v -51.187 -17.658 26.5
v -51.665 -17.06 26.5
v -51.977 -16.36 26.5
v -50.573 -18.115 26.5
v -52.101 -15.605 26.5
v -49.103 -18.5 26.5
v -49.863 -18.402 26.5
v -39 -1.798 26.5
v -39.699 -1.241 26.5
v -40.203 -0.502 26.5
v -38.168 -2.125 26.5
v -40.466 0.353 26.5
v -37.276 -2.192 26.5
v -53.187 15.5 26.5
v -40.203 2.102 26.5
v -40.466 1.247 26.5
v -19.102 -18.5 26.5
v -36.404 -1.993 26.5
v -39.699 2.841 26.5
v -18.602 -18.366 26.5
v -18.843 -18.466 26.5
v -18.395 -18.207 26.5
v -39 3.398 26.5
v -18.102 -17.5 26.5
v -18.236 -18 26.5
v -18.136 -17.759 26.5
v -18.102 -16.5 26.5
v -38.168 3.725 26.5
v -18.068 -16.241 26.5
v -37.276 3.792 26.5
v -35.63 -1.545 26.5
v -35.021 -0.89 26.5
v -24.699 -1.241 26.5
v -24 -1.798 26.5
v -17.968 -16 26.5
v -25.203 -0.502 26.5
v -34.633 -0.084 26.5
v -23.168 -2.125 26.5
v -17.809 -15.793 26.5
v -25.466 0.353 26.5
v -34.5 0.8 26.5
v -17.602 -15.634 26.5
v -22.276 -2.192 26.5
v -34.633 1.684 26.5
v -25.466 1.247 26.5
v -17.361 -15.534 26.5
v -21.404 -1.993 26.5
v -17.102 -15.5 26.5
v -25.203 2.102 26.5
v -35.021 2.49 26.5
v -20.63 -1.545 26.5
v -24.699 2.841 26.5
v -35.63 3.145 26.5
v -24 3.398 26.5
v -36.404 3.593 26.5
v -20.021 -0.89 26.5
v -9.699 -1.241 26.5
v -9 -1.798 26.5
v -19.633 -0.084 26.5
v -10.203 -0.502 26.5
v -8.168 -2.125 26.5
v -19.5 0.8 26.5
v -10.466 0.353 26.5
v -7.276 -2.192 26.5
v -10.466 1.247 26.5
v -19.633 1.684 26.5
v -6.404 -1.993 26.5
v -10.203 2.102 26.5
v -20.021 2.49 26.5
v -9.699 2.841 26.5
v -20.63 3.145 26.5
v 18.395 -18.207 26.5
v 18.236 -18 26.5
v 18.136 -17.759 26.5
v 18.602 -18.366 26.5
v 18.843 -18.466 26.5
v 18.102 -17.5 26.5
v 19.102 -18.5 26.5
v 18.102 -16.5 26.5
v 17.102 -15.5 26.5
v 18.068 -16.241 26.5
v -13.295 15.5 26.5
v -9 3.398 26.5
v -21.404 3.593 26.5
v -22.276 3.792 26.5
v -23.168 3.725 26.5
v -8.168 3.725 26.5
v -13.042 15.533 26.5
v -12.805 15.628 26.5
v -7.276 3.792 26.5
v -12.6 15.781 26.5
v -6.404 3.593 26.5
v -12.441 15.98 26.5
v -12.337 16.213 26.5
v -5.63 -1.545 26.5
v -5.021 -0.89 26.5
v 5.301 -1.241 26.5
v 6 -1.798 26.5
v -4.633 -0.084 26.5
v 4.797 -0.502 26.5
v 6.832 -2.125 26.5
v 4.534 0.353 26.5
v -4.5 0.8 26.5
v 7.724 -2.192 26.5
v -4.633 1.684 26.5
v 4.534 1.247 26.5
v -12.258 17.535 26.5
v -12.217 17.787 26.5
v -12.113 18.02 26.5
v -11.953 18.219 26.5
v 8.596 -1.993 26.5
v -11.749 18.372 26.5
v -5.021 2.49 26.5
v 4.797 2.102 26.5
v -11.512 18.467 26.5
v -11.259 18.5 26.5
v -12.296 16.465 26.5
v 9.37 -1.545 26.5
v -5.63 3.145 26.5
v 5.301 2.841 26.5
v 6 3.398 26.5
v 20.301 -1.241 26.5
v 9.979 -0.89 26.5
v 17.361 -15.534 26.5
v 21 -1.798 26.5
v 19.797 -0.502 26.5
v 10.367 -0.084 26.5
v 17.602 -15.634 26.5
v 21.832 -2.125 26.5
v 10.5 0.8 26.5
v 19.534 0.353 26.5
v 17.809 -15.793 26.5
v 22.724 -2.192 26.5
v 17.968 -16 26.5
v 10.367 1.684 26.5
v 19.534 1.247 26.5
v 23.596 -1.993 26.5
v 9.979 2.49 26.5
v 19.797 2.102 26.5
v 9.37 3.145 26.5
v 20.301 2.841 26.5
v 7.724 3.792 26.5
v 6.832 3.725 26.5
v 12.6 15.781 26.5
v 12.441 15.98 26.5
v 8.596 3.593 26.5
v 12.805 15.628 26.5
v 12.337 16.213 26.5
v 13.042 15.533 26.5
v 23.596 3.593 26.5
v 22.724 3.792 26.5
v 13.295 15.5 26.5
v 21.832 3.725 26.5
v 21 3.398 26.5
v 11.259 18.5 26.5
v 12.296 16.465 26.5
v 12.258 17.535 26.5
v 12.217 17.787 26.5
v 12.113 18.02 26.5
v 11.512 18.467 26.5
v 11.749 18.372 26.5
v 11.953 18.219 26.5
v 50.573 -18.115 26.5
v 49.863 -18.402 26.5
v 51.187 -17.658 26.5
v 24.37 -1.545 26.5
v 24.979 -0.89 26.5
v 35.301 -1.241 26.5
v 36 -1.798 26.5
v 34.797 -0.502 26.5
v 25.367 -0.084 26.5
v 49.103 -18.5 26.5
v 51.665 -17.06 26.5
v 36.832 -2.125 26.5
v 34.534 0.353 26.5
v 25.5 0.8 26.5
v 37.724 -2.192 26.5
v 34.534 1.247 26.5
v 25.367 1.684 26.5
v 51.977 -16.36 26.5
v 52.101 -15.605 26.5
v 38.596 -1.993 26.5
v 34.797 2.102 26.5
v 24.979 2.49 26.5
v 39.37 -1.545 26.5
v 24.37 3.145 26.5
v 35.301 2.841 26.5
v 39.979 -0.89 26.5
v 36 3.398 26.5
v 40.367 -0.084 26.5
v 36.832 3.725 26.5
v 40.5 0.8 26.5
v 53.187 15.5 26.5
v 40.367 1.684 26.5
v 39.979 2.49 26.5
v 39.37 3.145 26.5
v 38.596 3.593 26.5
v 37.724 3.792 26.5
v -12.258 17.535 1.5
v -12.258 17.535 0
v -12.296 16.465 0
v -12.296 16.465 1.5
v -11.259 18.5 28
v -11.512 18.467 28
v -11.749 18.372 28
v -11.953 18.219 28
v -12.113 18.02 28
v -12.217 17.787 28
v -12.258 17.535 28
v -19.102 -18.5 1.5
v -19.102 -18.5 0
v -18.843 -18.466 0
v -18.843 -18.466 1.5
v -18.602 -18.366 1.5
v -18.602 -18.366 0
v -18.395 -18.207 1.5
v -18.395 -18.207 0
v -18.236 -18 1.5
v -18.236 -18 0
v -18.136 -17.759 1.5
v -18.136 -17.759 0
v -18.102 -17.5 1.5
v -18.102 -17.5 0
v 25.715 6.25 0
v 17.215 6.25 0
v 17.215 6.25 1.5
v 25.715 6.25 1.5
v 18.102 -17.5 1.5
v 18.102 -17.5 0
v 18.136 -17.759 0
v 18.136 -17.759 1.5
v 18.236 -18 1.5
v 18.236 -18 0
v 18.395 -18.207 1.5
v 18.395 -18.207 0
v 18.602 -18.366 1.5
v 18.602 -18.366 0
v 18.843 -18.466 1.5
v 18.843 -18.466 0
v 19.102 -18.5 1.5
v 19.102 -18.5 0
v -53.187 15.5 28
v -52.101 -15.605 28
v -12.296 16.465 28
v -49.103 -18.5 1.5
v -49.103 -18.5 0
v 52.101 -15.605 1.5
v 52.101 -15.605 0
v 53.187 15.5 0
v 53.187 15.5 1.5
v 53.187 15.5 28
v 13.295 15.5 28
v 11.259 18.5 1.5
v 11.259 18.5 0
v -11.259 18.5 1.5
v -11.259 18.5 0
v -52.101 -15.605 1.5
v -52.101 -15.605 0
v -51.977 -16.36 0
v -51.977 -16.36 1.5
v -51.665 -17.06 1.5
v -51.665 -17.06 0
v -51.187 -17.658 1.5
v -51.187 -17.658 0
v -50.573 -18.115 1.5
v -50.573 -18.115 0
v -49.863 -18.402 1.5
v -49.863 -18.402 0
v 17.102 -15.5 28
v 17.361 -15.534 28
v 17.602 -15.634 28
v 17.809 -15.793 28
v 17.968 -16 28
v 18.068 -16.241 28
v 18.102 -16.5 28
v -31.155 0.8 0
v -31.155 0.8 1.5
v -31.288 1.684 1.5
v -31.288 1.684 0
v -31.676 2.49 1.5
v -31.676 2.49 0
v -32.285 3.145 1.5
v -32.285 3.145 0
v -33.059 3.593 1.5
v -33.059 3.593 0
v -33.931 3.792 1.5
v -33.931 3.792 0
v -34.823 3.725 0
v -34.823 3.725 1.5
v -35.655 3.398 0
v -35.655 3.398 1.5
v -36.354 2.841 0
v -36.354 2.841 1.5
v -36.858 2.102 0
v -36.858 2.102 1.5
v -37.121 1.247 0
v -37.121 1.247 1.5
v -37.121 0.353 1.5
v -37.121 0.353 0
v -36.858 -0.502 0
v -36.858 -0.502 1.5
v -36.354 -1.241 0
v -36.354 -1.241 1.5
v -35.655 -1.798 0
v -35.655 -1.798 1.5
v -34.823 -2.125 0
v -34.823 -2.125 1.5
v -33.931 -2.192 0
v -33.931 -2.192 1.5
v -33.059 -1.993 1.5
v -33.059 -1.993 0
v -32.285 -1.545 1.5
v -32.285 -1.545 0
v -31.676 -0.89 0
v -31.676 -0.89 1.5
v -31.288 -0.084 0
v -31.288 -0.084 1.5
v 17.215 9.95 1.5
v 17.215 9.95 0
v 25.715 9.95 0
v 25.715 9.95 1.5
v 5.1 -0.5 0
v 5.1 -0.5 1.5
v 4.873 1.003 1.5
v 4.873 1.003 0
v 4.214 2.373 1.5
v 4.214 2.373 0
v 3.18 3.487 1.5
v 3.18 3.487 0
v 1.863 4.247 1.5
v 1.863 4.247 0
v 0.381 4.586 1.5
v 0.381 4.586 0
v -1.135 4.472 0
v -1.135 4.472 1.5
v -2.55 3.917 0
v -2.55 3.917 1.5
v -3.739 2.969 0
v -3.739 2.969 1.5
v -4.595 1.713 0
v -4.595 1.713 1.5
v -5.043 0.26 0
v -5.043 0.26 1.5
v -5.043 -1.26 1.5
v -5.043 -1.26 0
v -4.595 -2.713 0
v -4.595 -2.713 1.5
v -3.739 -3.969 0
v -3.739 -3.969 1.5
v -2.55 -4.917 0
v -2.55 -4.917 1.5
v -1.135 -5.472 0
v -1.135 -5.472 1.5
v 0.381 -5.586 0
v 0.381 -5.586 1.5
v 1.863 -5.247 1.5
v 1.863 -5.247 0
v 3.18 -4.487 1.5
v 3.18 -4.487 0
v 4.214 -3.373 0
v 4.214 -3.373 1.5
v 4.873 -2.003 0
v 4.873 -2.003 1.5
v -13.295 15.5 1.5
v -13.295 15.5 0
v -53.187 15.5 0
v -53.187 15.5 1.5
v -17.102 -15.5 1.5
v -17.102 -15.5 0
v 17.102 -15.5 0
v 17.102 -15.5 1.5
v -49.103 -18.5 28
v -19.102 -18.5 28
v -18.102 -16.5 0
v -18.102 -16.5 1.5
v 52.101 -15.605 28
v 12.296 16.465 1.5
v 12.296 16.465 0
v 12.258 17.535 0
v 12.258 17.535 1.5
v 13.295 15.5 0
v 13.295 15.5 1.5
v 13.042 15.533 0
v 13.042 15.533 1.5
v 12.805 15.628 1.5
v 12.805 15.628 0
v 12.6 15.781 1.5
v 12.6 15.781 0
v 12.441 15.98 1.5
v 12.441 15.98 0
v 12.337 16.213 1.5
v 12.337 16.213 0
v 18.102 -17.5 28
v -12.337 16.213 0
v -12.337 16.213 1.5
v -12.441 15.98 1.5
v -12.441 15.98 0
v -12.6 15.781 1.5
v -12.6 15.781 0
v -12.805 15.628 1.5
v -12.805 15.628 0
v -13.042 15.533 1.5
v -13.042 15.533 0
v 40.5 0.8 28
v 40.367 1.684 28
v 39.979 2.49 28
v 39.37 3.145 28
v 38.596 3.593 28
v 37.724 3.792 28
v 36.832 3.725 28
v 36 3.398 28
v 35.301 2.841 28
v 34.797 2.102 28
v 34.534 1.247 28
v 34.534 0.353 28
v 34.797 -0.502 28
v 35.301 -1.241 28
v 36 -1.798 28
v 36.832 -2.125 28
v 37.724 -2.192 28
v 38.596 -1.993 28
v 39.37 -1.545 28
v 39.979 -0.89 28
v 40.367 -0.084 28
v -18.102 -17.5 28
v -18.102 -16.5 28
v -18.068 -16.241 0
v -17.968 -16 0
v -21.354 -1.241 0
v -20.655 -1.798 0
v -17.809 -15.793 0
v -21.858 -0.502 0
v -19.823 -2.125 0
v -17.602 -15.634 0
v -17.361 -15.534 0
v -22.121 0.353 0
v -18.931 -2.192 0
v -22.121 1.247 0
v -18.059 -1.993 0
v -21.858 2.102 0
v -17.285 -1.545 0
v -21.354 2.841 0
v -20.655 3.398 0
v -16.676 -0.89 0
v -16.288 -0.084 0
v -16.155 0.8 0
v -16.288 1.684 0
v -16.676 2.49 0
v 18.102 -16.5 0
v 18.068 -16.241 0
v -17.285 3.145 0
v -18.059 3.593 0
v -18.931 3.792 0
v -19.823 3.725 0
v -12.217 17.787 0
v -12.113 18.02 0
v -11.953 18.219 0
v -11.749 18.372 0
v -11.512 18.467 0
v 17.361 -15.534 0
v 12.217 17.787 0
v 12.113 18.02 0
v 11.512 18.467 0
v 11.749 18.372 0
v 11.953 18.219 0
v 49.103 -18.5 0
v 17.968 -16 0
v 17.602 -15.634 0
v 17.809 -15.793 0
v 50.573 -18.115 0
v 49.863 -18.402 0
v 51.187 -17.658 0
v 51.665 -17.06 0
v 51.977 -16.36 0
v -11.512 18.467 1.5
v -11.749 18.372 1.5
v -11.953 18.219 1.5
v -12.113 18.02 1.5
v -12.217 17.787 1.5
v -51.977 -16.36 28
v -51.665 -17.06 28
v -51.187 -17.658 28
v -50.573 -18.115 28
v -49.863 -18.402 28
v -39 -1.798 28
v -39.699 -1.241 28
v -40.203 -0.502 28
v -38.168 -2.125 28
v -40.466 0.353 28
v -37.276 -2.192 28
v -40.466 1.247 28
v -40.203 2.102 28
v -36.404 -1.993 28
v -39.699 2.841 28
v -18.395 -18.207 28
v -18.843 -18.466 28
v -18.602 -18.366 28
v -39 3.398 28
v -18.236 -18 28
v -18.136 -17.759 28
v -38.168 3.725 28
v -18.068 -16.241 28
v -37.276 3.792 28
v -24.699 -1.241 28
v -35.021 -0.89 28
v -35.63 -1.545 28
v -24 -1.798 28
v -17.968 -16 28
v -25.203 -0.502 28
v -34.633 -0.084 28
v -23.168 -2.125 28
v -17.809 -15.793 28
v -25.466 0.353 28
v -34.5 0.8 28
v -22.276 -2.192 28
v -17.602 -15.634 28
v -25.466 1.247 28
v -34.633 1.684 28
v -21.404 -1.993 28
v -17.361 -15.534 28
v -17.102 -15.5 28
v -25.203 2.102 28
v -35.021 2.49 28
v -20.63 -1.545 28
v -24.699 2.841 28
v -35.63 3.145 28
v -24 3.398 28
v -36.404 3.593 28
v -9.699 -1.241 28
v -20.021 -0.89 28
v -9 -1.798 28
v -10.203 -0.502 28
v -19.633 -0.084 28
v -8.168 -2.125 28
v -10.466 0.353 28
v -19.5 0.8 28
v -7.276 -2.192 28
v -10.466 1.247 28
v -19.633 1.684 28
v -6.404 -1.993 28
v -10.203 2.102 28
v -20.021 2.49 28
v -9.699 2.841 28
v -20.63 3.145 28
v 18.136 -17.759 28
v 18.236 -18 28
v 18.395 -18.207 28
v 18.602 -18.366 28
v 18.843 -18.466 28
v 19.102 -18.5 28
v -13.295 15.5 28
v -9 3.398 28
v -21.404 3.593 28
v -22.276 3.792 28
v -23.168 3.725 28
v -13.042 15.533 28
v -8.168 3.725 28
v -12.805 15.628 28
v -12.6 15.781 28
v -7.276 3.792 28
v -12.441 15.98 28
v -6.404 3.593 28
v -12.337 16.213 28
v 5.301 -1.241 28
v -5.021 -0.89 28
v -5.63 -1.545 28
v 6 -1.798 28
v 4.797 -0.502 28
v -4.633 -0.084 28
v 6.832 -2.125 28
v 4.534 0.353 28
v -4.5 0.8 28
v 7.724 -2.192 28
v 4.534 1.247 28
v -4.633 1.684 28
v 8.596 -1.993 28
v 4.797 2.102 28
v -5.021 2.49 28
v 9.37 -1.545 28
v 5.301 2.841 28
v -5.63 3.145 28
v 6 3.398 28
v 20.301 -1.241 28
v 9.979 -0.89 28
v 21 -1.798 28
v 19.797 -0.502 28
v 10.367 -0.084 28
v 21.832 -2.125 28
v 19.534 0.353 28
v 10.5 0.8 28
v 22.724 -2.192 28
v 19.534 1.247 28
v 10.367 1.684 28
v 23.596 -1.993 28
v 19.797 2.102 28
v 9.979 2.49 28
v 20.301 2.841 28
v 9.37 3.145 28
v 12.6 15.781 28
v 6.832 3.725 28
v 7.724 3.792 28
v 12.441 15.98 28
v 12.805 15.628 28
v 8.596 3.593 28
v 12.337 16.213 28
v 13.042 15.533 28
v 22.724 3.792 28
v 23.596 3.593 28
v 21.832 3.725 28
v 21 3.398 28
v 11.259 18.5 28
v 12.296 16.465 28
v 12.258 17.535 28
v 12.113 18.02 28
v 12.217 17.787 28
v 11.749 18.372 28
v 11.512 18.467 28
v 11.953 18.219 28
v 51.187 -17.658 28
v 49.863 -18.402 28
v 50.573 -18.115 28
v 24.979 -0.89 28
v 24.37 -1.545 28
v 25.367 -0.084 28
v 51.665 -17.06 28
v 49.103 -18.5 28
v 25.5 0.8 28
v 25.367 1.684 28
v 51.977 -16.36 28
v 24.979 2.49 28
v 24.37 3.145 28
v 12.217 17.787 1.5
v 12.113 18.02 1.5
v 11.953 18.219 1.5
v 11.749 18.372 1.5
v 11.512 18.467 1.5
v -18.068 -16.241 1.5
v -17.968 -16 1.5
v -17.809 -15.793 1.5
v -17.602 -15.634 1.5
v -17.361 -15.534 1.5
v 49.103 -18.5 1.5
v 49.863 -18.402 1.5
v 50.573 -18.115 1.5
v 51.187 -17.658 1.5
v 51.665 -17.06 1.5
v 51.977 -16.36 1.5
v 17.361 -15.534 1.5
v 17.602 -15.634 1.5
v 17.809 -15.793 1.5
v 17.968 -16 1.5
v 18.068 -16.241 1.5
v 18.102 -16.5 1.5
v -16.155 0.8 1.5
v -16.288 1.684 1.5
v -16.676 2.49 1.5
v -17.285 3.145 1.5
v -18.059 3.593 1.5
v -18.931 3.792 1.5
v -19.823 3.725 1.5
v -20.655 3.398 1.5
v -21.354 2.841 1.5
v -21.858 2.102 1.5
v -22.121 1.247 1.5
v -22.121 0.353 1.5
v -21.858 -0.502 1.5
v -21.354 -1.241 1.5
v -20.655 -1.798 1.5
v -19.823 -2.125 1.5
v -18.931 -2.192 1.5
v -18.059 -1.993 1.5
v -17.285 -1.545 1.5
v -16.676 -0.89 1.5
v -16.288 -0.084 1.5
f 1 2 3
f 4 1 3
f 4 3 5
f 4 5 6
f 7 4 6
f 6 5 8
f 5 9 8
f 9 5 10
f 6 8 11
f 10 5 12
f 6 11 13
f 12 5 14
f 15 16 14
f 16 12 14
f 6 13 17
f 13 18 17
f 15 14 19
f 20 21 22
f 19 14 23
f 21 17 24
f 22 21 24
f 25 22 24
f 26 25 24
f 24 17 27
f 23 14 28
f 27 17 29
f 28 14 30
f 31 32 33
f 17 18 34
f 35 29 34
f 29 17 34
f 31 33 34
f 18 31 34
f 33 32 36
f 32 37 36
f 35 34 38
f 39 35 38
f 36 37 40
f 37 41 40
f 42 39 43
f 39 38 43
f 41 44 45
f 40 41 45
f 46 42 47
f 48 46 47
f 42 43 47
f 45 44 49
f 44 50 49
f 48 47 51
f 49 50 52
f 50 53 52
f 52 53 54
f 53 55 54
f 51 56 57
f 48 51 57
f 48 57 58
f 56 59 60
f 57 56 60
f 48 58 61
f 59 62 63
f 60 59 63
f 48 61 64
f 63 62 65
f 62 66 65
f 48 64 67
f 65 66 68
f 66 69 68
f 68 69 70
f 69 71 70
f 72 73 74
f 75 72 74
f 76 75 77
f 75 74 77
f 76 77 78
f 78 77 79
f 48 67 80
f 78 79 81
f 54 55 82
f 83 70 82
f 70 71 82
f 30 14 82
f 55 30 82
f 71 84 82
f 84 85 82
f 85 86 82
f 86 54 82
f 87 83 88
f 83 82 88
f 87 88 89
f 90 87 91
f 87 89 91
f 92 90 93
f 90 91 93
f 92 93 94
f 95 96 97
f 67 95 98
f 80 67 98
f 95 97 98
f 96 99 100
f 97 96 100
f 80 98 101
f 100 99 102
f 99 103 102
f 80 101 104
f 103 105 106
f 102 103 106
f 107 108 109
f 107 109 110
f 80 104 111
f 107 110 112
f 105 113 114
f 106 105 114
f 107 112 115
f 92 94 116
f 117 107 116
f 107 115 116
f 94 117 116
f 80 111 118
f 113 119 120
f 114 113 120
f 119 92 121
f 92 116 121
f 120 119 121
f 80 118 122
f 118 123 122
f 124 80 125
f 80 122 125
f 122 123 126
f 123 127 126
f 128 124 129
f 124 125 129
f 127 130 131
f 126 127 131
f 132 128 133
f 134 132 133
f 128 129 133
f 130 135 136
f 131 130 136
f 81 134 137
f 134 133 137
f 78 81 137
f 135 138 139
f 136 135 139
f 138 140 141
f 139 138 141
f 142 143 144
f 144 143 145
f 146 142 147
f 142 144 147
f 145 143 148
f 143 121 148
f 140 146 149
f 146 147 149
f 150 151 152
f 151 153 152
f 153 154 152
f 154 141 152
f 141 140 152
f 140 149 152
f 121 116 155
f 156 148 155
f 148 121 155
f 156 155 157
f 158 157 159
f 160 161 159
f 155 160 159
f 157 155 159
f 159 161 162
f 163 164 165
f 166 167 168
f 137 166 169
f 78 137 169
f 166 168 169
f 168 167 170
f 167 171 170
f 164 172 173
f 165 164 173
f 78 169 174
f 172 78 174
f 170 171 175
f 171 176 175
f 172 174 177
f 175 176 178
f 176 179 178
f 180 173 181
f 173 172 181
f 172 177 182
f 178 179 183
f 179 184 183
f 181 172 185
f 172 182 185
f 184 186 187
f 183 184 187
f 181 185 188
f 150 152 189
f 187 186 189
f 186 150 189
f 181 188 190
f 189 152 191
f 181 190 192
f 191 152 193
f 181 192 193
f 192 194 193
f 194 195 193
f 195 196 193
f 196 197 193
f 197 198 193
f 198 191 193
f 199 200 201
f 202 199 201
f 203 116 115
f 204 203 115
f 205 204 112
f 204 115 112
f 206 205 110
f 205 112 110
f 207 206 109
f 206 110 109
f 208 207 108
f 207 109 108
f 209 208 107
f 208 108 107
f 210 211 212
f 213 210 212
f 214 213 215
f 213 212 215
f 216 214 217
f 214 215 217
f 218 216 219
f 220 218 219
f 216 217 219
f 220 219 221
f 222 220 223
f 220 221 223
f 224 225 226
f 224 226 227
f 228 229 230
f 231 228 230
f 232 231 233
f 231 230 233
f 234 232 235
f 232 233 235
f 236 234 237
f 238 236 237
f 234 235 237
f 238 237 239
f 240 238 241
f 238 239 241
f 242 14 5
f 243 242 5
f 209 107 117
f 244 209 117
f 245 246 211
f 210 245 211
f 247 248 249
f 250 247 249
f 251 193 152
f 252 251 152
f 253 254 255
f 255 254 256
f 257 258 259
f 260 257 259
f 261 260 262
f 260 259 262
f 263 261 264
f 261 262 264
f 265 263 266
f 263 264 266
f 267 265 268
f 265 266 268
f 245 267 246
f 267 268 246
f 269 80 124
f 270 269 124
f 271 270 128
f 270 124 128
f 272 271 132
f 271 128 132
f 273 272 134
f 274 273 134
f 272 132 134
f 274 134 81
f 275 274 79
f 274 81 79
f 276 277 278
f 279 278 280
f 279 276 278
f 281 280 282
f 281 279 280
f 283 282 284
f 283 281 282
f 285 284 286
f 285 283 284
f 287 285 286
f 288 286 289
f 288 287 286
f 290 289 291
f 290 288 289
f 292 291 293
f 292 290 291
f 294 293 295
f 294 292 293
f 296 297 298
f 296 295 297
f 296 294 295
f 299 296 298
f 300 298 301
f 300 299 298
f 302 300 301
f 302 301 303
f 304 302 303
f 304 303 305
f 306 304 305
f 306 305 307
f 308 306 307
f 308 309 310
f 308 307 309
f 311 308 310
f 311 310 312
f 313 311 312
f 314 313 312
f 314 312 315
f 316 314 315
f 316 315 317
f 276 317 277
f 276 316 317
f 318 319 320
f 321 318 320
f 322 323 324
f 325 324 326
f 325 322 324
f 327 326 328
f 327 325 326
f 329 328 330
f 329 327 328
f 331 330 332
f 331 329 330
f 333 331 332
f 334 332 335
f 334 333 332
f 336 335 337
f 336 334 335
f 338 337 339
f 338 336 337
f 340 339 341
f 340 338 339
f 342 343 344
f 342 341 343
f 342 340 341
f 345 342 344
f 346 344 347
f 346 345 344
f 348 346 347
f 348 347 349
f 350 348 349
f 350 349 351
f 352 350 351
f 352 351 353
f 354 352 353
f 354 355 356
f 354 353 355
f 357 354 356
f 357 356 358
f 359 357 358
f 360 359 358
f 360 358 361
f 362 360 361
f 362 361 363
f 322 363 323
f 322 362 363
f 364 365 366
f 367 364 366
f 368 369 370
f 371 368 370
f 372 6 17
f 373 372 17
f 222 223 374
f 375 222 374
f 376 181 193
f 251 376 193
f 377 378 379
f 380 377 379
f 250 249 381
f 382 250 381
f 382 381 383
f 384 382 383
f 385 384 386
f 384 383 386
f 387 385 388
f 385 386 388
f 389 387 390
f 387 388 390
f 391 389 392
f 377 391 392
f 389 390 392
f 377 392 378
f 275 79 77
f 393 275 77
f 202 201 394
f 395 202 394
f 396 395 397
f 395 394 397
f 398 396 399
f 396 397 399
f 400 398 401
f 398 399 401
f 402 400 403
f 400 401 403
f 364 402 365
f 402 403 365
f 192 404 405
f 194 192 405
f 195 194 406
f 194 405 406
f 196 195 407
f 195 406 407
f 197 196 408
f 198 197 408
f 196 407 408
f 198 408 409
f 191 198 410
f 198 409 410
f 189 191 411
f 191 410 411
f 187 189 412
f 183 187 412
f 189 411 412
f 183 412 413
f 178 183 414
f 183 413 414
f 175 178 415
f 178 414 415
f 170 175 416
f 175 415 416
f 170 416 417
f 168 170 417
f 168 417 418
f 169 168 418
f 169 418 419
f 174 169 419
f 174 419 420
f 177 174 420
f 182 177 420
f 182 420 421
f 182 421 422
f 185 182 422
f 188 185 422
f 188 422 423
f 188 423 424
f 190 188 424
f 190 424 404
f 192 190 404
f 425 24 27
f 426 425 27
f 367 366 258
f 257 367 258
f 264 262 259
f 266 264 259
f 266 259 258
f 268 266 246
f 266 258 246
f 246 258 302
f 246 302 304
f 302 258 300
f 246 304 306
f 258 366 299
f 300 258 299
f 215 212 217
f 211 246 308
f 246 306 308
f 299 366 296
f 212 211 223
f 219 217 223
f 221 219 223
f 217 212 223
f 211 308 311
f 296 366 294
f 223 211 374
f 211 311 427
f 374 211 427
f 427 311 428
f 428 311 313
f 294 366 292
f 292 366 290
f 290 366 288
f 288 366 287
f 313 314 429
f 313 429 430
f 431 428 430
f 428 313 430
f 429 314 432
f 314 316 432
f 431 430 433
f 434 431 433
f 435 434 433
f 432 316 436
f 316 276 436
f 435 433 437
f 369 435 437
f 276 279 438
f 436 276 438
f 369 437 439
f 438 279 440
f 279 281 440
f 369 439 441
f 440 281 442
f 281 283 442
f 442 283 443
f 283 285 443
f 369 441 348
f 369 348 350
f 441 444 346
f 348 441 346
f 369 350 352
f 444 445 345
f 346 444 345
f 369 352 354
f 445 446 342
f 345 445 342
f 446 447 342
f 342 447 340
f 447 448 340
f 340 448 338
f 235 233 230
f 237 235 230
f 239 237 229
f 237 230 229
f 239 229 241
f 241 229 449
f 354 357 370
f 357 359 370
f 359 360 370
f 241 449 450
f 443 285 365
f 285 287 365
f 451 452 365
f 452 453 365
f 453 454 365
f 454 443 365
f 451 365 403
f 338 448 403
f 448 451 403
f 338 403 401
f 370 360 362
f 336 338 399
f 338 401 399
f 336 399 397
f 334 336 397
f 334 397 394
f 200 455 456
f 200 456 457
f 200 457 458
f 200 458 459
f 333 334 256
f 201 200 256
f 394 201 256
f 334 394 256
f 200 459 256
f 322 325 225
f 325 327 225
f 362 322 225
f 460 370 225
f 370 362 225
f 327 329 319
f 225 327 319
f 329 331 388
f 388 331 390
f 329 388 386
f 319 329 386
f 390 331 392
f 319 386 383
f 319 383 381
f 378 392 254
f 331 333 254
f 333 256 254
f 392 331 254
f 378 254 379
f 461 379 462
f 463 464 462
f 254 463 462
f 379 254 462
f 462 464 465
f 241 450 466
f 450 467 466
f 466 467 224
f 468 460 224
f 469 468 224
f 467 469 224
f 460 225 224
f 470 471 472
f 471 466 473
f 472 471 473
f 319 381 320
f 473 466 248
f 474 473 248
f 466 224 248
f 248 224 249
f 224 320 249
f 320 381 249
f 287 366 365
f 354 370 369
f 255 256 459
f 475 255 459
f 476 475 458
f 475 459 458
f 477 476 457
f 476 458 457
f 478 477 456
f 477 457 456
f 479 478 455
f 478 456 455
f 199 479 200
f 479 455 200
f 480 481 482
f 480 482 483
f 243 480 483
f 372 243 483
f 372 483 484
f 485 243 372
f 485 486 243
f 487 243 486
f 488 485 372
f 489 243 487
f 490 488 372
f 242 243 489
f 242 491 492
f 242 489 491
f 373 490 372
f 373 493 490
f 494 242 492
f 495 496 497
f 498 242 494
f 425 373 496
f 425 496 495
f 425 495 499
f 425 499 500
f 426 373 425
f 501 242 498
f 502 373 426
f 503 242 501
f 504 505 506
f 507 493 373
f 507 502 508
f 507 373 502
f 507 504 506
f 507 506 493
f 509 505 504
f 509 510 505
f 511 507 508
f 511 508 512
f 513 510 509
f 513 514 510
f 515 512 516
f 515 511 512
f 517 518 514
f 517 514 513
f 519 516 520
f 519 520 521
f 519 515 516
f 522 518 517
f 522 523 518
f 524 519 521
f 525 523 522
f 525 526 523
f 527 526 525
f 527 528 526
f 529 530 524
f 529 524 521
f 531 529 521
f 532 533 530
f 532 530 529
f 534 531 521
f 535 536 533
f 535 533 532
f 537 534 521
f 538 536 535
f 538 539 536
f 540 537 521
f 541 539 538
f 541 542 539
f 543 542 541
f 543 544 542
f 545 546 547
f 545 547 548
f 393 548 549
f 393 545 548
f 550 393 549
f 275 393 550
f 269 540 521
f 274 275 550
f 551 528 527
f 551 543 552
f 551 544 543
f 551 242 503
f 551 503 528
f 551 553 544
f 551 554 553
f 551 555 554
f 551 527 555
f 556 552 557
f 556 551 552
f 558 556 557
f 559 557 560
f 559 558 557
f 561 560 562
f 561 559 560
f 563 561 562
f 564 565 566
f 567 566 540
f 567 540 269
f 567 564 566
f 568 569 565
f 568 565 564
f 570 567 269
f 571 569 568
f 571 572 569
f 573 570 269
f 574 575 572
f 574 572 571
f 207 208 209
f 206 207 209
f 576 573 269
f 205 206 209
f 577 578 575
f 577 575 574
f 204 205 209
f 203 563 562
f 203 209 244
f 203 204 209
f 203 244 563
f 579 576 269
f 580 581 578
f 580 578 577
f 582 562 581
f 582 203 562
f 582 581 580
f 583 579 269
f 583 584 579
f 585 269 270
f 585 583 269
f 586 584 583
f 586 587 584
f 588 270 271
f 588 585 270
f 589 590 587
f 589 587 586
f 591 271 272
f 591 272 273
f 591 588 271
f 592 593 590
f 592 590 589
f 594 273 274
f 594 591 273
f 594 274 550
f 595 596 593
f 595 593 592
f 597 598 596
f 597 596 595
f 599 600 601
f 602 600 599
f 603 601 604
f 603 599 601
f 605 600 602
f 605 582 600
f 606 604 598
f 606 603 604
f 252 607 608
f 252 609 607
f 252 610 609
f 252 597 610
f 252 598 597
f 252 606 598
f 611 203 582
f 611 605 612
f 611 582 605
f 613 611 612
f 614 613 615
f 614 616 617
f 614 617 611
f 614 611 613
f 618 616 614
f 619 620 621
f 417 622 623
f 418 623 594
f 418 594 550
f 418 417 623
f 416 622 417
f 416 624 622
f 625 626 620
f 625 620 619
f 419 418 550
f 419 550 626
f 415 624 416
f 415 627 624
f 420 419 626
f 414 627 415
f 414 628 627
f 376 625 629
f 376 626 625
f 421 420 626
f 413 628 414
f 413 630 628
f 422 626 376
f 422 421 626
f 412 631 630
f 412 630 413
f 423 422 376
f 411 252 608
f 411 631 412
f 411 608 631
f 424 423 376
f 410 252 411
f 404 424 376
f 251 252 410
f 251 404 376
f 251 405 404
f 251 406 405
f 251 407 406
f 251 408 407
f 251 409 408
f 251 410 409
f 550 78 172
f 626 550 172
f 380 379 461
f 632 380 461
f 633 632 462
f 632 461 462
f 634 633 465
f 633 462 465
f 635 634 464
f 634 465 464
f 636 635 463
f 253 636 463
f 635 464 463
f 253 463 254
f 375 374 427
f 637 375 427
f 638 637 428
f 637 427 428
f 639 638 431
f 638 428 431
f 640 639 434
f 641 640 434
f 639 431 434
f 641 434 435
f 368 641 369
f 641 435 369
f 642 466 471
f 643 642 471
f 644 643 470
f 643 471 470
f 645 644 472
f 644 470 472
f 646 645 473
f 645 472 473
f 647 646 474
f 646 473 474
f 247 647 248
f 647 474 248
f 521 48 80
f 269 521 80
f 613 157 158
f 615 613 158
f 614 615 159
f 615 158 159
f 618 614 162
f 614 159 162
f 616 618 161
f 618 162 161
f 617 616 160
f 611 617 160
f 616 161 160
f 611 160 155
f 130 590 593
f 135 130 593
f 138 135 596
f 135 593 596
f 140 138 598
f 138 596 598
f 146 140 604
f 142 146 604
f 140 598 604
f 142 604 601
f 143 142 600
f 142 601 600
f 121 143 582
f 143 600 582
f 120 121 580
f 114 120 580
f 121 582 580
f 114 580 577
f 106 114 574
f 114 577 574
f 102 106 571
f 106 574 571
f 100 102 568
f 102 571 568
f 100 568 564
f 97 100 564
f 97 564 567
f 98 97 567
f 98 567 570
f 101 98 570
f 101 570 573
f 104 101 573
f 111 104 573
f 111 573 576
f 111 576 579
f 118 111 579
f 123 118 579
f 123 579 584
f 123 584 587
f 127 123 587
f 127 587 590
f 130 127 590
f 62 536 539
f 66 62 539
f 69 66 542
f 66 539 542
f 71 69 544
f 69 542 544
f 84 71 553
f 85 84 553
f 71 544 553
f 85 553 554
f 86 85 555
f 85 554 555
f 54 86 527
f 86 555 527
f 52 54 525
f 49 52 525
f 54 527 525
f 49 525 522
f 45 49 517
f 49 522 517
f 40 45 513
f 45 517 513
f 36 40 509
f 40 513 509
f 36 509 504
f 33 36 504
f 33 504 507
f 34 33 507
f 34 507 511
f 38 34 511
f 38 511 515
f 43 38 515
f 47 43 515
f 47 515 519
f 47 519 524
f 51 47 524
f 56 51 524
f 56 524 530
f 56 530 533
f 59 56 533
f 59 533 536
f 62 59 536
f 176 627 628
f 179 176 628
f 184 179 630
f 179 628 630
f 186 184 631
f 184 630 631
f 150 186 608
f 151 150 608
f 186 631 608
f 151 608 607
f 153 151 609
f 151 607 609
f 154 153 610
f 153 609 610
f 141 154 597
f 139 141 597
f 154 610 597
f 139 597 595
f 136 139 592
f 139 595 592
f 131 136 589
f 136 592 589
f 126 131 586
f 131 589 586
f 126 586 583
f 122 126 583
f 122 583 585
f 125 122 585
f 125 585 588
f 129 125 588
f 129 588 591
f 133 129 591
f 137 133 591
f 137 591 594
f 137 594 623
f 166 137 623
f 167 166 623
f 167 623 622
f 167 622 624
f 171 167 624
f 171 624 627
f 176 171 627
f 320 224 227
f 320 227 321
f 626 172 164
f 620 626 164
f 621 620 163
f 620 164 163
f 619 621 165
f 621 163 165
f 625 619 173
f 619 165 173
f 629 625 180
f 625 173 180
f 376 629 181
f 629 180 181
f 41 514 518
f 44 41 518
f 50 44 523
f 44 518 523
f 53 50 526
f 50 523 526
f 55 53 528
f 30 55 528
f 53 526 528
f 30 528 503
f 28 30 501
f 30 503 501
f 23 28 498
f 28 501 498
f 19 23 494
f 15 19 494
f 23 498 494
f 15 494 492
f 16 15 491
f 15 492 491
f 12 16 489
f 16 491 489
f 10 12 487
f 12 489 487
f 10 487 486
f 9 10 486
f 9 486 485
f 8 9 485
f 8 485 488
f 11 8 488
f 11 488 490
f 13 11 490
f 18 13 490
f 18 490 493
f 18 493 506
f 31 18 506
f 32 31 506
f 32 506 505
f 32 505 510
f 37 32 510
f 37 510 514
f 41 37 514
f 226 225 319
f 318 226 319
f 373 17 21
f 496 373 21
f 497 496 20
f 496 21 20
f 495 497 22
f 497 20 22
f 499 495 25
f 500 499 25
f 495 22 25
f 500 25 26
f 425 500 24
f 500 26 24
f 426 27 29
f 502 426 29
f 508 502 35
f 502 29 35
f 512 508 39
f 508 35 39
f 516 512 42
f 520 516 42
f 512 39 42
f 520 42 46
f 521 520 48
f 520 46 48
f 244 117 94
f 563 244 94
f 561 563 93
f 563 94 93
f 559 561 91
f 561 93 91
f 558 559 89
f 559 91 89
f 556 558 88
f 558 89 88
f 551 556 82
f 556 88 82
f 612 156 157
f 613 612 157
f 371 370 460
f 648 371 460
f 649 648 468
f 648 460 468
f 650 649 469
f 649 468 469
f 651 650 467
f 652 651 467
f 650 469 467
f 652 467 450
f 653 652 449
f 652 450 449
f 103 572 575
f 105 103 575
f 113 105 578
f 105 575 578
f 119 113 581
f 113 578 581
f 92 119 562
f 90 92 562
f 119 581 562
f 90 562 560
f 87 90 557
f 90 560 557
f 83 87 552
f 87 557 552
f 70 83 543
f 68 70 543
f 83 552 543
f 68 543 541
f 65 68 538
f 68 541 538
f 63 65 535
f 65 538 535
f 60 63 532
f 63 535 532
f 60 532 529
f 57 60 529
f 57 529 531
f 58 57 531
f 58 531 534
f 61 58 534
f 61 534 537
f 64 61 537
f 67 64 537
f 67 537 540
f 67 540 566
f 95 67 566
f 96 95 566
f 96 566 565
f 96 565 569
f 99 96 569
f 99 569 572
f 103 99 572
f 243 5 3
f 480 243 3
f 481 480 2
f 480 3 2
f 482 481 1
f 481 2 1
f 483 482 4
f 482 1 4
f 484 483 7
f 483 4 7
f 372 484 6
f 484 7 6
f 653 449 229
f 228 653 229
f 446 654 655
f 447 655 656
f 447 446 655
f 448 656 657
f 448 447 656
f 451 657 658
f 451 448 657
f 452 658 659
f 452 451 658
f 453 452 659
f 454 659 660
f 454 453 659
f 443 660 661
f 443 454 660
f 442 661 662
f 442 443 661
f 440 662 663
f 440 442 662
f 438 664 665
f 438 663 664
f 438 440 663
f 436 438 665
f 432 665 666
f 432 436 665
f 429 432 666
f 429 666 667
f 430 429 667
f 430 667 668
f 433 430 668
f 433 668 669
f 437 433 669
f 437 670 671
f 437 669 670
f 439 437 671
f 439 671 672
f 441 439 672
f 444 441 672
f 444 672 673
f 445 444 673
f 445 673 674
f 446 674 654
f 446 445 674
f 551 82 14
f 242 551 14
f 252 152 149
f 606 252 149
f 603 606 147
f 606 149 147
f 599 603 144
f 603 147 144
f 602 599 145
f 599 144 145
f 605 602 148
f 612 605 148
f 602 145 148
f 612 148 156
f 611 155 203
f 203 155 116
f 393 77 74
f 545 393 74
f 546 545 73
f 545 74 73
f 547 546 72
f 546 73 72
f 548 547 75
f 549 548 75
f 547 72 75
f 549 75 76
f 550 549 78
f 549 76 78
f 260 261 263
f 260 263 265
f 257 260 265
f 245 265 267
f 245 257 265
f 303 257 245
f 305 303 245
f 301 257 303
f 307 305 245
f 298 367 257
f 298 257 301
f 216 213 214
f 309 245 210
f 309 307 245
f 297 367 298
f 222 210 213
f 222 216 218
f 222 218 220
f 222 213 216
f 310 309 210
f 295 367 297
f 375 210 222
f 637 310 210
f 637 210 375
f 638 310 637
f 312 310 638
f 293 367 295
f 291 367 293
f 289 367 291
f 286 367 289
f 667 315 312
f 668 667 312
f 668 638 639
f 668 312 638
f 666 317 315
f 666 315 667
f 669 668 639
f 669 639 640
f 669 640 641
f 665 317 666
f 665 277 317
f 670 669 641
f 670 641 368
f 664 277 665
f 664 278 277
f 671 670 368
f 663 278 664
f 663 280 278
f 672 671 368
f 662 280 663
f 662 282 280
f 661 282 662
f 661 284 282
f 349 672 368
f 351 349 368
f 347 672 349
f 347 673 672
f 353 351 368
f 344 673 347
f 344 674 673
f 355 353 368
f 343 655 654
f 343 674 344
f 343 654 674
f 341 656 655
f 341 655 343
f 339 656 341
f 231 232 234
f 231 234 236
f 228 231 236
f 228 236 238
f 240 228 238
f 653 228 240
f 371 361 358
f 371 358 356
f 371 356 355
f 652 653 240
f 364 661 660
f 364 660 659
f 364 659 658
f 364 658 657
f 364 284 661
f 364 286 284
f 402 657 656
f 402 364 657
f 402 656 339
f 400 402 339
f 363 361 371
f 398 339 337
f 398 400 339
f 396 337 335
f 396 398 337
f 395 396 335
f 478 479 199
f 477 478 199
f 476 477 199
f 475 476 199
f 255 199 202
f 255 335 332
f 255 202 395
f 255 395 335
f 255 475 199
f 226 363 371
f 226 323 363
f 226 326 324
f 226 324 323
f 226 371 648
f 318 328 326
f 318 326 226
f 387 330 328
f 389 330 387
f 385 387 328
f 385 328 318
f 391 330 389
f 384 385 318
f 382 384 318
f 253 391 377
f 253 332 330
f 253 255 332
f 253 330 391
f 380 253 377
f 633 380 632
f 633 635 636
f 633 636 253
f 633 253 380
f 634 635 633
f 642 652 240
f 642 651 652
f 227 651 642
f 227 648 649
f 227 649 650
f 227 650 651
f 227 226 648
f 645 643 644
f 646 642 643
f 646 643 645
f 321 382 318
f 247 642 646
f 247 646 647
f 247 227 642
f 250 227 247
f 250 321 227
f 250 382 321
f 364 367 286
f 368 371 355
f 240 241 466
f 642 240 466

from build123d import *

# Parameters (mm, degrees)
F1_DEPTH = 1.5
F2_R     = 3
F2_R_2   = 5.1
F2_W     = 8.5
F2_H     = 3.7
F3_DEPTH = 25
F6_DEPTH = 1.5
F7_R     = 3
F8_DEPTH = 5


# Not quite as in the source:
# - ends of sketch curves that miss each other by under 0.0002 mm in the source are joined


with BuildPart() as f1:
    # F0 (on Top) → F1 (new body)
    with BuildSketch(Plane.XY):
        with BuildLine():
            ThreePointArc((49.102934, -18.5), (51.1869092815, -17.6580192367), (52.1011064976, -15.6046980174))
            Line((52.1011064976, -15.6046980174), (53.187306, 15.5))
            Line((53.187306, 15.5), (13.294894, 15.5))
            ThreePointArc((13.294894, 15.5), (12.6002354488, 15.7806603742), (12.2955031554, 16.4651010054))
            Line((12.2955031554, 16.4651010054), (12.258145, 17.534899))
            ThreePointArc((12.258145, 17.534899), (11.9534125512, 18.2193396258), (11.258754, 18.5))
            Line((11.258754, 18.5), (-11.258754, 18.5))
            ThreePointArc((-11.258754, 18.5), (-11.9534125512, 18.2193396258), (-12.2581448446, 17.5348989946))
            Line((-12.2581448446, 17.5348989946), (-12.295503, 16.465101))
            ThreePointArc((-12.295503, 16.465101), (-12.6002354488, 15.7806603742), (-13.294894, 15.5))
            Line((-13.294894, 15.5), (-53.187306, 15.5))
            Line((-53.187306, 15.5), (-52.101106, -15.604698))
            ThreePointArc((-52.101106, -15.604698), (-51.1869092815, -17.6580192367), (-49.102934, -18.5))
            Line((-49.102934, -18.5), (-19.10173, -18.5))
            ThreePointArc((-19.10173, -18.5), (-18.3946232188, -18.2071067812), (-18.10173, -17.5))
            Line((-18.10173, -17.5), (-18.10173, -16.5))
            ThreePointArc((-18.10173, -16.5), (-17.8088367812, -15.7928932188), (-17.10173, -15.5))
            Line((-17.10173, -15.5), (17.10173, -15.5))
            ThreePointArc((17.10173, -15.5), (17.8088367812, -15.7928932188), (18.10173, -16.5))
            Line((18.10173, -16.5), (18.10173, -17.5))
            ThreePointArc((18.10173, -17.5), (18.3946232188, -18.2071067812), (19.10173, -18.5))
            Line((19.10173, -18.5), (49.102934, -18.5))
        make_face()
    extrude(amount=F1_DEPTH)

    # F2 (on face) → F3 (cut)
    with BuildSketch(Plane.XY):
        with Locations((-34.155, 0.8)):
            Circle(F2_R)
        with Locations((-19.155, 0.8)):
            Circle(F2_R)
        with Locations((0, -0.5)):
            Circle(F2_R_2)
        with Locations((21.465, 8.1)):
            Rectangle(F2_W, F2_H)
    extrude(amount=F3_DEPTH, mode=Mode.SUBTRACT)


with BuildPart() as f6:
    # F5 (on offset) → F6 (new body)
    with BuildSketch(Plane.XY.offset(26.5)):
        with BuildLine():
            ThreePointArc((49.102934, -18.5), (51.1869092815, -17.6580192367), (52.1011064976, -15.6046980174))
            Line((52.1011064976, -15.6046980174), (53.187306, 15.5))
            Line((53.187306, 15.5), (13.294894, 15.5))
            ThreePointArc((13.294894, 15.5), (12.6002354488, 15.7806603742), (12.2955031554, 16.4651010054))
            Line((12.2955031554, 16.4651010054), (12.258145, 17.534899))
            ThreePointArc((12.258145, 17.534899), (11.9534125512, 18.2193396258), (11.258754, 18.5))
            Line((11.258754, 18.5), (-11.258754, 18.5))
            ThreePointArc((-11.258754, 18.5), (-11.9534125512, 18.2193396258), (-12.2581448446, 17.5348989946))
            Line((-12.2581448446, 17.5348989946), (-12.295503, 16.465101))
            ThreePointArc((-12.295503, 16.465101), (-12.6002354488, 15.7806603742), (-13.294894, 15.5))
            Line((-13.294894, 15.5), (-53.187306, 15.5))
            Line((-53.187306, 15.5), (-52.101106, -15.604698))
            ThreePointArc((-52.101106, -15.604698), (-51.1869092815, -17.6580192367), (-49.102934, -18.5))
            Line((-49.102934, -18.5), (-19.10173, -18.5))
            ThreePointArc((-19.10173, -18.5), (-18.3946232188, -18.2071067812), (-18.10173, -17.5))
            Line((-18.10173, -17.5), (-18.10173, -16.5))
            ThreePointArc((-18.10173, -16.5), (-17.8088367812, -15.7928932188), (-17.10173, -15.5))
            Line((-17.10173, -15.5), (17.10173, -15.5))
            ThreePointArc((17.10173, -15.5), (17.8088367812, -15.7928932188), (18.10173, -16.5))
            Line((18.10173, -16.5), (18.10173, -17.5))
            ThreePointArc((18.10173, -17.5), (18.3946232188, -18.2071067812), (19.10173, -18.5))
            Line((19.10173, -18.5), (49.102934, -18.5))
        make_face()
    extrude(amount=F6_DEPTH)

    # F7 (on face) → F8 (cut)
    with BuildSketch(Plane.XY.offset(28)):
        with Locations((-37.5, 0.8)):
            Circle(F7_R)
        with Locations((-22.5, 0.8)):
            Circle(F7_R)
        with Locations((-7.5, 0.8)):
            Circle(F7_R)
        with Locations((7.5, 0.8)):
            Circle(F7_R)
        with Locations((37.5, 0.8)):
            Circle(F7_R)
        with Locations((22.5, 0.8)):
            Circle(F7_R)
    extrude(amount=-F8_DEPTH, mode=Mode.SUBTRACT)


solid = Compound([f1.part, f6.part])
